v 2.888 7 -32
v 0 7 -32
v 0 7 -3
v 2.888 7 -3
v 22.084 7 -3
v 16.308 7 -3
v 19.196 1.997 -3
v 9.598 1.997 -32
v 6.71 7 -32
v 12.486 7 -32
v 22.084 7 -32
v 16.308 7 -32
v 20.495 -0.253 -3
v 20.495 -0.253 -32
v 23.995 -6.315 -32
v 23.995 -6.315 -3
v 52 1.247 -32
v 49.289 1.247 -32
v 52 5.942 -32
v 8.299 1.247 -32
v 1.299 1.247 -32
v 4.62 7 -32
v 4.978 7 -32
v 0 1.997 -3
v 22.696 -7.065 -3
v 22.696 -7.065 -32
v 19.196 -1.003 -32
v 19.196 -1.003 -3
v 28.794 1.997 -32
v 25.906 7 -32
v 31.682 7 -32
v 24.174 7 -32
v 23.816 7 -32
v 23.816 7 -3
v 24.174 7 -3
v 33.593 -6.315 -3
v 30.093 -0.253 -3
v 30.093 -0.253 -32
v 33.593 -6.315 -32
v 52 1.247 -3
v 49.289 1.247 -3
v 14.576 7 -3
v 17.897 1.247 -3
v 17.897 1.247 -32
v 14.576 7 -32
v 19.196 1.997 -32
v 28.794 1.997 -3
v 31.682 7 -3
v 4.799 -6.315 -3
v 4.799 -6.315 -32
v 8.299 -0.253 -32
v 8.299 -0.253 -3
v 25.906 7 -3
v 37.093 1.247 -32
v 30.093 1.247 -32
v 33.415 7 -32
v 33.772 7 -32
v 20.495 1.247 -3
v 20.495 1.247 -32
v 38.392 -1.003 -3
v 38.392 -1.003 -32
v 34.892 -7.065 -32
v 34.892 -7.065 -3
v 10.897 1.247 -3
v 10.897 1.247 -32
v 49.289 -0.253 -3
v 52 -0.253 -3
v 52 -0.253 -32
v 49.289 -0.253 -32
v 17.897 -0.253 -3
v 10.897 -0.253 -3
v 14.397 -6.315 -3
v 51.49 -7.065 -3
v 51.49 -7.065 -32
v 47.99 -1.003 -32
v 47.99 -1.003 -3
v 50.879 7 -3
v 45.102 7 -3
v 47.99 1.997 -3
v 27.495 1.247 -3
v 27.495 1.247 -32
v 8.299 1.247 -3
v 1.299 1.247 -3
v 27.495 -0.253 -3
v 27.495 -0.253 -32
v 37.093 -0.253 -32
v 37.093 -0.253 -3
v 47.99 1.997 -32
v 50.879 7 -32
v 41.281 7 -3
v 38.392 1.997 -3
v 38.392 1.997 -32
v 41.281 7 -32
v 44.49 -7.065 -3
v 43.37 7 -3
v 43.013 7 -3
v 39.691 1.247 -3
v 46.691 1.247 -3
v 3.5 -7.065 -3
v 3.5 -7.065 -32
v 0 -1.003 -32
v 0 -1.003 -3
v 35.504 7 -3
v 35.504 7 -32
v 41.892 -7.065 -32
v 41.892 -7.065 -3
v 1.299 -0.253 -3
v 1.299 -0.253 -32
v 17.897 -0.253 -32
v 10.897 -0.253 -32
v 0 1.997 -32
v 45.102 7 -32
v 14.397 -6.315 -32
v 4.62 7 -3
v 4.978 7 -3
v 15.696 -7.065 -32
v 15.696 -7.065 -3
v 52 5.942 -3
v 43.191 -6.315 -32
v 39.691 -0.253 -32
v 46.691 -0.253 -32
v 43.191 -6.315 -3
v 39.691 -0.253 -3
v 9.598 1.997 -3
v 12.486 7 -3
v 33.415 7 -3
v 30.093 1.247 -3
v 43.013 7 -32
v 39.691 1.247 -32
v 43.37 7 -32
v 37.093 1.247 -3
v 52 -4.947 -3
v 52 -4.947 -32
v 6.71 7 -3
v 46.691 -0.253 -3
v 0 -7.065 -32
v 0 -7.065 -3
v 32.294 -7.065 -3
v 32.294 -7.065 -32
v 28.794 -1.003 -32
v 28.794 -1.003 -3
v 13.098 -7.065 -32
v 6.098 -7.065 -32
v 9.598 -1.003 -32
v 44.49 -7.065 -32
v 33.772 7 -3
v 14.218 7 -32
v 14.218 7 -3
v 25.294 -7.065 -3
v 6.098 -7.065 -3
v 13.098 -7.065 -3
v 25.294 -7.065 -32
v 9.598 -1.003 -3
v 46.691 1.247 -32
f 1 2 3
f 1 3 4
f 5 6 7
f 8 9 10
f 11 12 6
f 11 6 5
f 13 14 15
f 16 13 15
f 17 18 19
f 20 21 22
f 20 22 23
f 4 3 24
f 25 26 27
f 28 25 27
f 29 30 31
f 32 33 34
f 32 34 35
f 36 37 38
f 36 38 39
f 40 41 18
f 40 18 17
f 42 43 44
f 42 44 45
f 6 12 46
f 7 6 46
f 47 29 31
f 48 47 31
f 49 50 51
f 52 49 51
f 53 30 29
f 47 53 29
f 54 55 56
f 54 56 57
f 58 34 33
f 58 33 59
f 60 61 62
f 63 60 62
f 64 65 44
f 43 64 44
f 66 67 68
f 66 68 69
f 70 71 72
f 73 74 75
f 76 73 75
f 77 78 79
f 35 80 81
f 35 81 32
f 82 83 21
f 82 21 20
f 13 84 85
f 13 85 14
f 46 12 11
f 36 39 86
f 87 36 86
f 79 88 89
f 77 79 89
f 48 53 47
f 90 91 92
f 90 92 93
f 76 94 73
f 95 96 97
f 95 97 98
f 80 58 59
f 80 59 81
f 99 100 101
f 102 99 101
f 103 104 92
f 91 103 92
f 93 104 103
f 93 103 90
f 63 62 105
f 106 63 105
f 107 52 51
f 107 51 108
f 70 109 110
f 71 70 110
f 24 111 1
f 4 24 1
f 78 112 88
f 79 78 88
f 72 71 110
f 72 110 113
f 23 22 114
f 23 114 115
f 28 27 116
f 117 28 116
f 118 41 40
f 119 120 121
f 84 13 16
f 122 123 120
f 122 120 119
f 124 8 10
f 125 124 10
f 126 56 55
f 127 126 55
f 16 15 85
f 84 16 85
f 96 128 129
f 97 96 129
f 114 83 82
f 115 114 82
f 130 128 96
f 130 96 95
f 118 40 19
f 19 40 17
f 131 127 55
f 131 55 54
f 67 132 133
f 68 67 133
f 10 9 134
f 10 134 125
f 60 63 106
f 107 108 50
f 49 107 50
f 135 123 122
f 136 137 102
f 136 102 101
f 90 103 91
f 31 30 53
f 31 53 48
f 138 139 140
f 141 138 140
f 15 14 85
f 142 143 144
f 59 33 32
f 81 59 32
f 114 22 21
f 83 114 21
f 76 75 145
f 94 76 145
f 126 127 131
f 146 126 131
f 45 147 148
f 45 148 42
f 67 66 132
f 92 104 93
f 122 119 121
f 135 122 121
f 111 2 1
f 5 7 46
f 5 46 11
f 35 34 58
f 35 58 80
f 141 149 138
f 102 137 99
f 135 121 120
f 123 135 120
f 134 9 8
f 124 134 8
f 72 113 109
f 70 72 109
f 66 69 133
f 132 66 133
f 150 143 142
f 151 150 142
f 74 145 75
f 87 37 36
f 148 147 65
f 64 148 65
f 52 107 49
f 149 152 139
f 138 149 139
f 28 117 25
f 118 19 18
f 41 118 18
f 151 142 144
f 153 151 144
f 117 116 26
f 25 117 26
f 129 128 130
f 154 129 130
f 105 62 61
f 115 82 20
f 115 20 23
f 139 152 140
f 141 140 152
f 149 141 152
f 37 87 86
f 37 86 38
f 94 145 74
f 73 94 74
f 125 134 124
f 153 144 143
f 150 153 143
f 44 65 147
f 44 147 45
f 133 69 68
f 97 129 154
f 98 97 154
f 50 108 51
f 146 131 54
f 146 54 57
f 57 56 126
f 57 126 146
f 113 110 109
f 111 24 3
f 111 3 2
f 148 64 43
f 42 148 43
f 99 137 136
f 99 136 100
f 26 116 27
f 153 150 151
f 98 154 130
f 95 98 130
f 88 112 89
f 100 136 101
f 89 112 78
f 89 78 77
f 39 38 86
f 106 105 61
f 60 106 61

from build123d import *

# Parameters (mm, degrees)
BOX004_W              = 52
BOX004_H              = 29
BOX004_DEPTH          = 15
BOX004_ROLL_ANGLE     = -90
PAD008_DEPTH          = 50
ARRAY_COUNT           = 6
ARRAY_PLACEMENT_ANGLE = 90
ARRAY001_X_COUNT      = 8
ARRAY001_X_PITCH      = 16.624356
ARRAY001_Y_COUNT      = 8
ARRAY001_Y_PITCH      = 16.624356


with BuildPart() as mrdomain:
    # Box004 → Box004 (new body)
    with BuildSketch(Plane.XY):
        with Locations((26, 14.5)):
            Rectangle(BOX004_W, BOX004_H)
    extrude(amount=BOX004_DEPTH)


with BuildPart() as mrdomain_1:
    # Box004 roll: moved
    add(mrdomain.part.rotate(Axis((0, 0, 0), (1, 0, 0)), BOX004_ROLL_ANGLE))


with BuildPart() as mrdomain_2:
    # Box004 placement: moved
    add(mrdomain_1.part.moved(Location((0, -8, -3))))


with BuildPart() as coremrtool:
    # Sketch020 → Pad008 (new body)
    with BuildSketch(Plane.XY):
        Polygon((7.562178, 3.5), (1.5, 0), (7.562178, -3.5), align=None)
    extrude(amount=PAD008_DEPTH)

    # Array: CoreMRTool ×6 about axis
    array_axis = Axis((0, 0, 0), (0, 0, 1))


with BuildPart() as coremrtool_1:
    add(coremrtool.part)
    for i in range(1, ARRAY_COUNT):
        add(coremrtool.part.rotate(array_axis, i * 360 / ARRAY_COUNT))


with BuildPart() as coremrtool_2:
    # Array placement: moved
    add(coremrtool_1.part.rotate(Axis((0, 0, 0), (0, 0, 1)), ARRAY_PLACEMENT_ANGLE))

    # Array001 X: CoreMRTool ×8


with BuildPart() as coremrtool_3:
    add(coremrtool_2.part)
    with Locations(*[Vector(0.866025, 0.5, 0) * (i * ARRAY001_X_PITCH) for i in range(1, ARRAY001_X_COUNT)]):
        add(coremrtool_2.part)

    # Array001 Y: CoreMRTool ×8


with BuildPart() as coremrtool_4:
    add(coremrtool_3.part)
    with Locations(*[Vector(-0.866025, 0.5, 0) * (i * ARRAY001_Y_PITCH) for i in range(1, ARRAY001_Y_COUNT)]):
        add(coremrtool_3.part)


with BuildPart() as coremrtool_5:
    # Clone015 placement: moved
    add(coremrtool_4.part.moved(Location((0, -66, -39))))

    # Common001: intersect MRDomain
    add(mrdomain_2.part, mode=Mode.INTERSECT)


solid = coremrtool_5.part
